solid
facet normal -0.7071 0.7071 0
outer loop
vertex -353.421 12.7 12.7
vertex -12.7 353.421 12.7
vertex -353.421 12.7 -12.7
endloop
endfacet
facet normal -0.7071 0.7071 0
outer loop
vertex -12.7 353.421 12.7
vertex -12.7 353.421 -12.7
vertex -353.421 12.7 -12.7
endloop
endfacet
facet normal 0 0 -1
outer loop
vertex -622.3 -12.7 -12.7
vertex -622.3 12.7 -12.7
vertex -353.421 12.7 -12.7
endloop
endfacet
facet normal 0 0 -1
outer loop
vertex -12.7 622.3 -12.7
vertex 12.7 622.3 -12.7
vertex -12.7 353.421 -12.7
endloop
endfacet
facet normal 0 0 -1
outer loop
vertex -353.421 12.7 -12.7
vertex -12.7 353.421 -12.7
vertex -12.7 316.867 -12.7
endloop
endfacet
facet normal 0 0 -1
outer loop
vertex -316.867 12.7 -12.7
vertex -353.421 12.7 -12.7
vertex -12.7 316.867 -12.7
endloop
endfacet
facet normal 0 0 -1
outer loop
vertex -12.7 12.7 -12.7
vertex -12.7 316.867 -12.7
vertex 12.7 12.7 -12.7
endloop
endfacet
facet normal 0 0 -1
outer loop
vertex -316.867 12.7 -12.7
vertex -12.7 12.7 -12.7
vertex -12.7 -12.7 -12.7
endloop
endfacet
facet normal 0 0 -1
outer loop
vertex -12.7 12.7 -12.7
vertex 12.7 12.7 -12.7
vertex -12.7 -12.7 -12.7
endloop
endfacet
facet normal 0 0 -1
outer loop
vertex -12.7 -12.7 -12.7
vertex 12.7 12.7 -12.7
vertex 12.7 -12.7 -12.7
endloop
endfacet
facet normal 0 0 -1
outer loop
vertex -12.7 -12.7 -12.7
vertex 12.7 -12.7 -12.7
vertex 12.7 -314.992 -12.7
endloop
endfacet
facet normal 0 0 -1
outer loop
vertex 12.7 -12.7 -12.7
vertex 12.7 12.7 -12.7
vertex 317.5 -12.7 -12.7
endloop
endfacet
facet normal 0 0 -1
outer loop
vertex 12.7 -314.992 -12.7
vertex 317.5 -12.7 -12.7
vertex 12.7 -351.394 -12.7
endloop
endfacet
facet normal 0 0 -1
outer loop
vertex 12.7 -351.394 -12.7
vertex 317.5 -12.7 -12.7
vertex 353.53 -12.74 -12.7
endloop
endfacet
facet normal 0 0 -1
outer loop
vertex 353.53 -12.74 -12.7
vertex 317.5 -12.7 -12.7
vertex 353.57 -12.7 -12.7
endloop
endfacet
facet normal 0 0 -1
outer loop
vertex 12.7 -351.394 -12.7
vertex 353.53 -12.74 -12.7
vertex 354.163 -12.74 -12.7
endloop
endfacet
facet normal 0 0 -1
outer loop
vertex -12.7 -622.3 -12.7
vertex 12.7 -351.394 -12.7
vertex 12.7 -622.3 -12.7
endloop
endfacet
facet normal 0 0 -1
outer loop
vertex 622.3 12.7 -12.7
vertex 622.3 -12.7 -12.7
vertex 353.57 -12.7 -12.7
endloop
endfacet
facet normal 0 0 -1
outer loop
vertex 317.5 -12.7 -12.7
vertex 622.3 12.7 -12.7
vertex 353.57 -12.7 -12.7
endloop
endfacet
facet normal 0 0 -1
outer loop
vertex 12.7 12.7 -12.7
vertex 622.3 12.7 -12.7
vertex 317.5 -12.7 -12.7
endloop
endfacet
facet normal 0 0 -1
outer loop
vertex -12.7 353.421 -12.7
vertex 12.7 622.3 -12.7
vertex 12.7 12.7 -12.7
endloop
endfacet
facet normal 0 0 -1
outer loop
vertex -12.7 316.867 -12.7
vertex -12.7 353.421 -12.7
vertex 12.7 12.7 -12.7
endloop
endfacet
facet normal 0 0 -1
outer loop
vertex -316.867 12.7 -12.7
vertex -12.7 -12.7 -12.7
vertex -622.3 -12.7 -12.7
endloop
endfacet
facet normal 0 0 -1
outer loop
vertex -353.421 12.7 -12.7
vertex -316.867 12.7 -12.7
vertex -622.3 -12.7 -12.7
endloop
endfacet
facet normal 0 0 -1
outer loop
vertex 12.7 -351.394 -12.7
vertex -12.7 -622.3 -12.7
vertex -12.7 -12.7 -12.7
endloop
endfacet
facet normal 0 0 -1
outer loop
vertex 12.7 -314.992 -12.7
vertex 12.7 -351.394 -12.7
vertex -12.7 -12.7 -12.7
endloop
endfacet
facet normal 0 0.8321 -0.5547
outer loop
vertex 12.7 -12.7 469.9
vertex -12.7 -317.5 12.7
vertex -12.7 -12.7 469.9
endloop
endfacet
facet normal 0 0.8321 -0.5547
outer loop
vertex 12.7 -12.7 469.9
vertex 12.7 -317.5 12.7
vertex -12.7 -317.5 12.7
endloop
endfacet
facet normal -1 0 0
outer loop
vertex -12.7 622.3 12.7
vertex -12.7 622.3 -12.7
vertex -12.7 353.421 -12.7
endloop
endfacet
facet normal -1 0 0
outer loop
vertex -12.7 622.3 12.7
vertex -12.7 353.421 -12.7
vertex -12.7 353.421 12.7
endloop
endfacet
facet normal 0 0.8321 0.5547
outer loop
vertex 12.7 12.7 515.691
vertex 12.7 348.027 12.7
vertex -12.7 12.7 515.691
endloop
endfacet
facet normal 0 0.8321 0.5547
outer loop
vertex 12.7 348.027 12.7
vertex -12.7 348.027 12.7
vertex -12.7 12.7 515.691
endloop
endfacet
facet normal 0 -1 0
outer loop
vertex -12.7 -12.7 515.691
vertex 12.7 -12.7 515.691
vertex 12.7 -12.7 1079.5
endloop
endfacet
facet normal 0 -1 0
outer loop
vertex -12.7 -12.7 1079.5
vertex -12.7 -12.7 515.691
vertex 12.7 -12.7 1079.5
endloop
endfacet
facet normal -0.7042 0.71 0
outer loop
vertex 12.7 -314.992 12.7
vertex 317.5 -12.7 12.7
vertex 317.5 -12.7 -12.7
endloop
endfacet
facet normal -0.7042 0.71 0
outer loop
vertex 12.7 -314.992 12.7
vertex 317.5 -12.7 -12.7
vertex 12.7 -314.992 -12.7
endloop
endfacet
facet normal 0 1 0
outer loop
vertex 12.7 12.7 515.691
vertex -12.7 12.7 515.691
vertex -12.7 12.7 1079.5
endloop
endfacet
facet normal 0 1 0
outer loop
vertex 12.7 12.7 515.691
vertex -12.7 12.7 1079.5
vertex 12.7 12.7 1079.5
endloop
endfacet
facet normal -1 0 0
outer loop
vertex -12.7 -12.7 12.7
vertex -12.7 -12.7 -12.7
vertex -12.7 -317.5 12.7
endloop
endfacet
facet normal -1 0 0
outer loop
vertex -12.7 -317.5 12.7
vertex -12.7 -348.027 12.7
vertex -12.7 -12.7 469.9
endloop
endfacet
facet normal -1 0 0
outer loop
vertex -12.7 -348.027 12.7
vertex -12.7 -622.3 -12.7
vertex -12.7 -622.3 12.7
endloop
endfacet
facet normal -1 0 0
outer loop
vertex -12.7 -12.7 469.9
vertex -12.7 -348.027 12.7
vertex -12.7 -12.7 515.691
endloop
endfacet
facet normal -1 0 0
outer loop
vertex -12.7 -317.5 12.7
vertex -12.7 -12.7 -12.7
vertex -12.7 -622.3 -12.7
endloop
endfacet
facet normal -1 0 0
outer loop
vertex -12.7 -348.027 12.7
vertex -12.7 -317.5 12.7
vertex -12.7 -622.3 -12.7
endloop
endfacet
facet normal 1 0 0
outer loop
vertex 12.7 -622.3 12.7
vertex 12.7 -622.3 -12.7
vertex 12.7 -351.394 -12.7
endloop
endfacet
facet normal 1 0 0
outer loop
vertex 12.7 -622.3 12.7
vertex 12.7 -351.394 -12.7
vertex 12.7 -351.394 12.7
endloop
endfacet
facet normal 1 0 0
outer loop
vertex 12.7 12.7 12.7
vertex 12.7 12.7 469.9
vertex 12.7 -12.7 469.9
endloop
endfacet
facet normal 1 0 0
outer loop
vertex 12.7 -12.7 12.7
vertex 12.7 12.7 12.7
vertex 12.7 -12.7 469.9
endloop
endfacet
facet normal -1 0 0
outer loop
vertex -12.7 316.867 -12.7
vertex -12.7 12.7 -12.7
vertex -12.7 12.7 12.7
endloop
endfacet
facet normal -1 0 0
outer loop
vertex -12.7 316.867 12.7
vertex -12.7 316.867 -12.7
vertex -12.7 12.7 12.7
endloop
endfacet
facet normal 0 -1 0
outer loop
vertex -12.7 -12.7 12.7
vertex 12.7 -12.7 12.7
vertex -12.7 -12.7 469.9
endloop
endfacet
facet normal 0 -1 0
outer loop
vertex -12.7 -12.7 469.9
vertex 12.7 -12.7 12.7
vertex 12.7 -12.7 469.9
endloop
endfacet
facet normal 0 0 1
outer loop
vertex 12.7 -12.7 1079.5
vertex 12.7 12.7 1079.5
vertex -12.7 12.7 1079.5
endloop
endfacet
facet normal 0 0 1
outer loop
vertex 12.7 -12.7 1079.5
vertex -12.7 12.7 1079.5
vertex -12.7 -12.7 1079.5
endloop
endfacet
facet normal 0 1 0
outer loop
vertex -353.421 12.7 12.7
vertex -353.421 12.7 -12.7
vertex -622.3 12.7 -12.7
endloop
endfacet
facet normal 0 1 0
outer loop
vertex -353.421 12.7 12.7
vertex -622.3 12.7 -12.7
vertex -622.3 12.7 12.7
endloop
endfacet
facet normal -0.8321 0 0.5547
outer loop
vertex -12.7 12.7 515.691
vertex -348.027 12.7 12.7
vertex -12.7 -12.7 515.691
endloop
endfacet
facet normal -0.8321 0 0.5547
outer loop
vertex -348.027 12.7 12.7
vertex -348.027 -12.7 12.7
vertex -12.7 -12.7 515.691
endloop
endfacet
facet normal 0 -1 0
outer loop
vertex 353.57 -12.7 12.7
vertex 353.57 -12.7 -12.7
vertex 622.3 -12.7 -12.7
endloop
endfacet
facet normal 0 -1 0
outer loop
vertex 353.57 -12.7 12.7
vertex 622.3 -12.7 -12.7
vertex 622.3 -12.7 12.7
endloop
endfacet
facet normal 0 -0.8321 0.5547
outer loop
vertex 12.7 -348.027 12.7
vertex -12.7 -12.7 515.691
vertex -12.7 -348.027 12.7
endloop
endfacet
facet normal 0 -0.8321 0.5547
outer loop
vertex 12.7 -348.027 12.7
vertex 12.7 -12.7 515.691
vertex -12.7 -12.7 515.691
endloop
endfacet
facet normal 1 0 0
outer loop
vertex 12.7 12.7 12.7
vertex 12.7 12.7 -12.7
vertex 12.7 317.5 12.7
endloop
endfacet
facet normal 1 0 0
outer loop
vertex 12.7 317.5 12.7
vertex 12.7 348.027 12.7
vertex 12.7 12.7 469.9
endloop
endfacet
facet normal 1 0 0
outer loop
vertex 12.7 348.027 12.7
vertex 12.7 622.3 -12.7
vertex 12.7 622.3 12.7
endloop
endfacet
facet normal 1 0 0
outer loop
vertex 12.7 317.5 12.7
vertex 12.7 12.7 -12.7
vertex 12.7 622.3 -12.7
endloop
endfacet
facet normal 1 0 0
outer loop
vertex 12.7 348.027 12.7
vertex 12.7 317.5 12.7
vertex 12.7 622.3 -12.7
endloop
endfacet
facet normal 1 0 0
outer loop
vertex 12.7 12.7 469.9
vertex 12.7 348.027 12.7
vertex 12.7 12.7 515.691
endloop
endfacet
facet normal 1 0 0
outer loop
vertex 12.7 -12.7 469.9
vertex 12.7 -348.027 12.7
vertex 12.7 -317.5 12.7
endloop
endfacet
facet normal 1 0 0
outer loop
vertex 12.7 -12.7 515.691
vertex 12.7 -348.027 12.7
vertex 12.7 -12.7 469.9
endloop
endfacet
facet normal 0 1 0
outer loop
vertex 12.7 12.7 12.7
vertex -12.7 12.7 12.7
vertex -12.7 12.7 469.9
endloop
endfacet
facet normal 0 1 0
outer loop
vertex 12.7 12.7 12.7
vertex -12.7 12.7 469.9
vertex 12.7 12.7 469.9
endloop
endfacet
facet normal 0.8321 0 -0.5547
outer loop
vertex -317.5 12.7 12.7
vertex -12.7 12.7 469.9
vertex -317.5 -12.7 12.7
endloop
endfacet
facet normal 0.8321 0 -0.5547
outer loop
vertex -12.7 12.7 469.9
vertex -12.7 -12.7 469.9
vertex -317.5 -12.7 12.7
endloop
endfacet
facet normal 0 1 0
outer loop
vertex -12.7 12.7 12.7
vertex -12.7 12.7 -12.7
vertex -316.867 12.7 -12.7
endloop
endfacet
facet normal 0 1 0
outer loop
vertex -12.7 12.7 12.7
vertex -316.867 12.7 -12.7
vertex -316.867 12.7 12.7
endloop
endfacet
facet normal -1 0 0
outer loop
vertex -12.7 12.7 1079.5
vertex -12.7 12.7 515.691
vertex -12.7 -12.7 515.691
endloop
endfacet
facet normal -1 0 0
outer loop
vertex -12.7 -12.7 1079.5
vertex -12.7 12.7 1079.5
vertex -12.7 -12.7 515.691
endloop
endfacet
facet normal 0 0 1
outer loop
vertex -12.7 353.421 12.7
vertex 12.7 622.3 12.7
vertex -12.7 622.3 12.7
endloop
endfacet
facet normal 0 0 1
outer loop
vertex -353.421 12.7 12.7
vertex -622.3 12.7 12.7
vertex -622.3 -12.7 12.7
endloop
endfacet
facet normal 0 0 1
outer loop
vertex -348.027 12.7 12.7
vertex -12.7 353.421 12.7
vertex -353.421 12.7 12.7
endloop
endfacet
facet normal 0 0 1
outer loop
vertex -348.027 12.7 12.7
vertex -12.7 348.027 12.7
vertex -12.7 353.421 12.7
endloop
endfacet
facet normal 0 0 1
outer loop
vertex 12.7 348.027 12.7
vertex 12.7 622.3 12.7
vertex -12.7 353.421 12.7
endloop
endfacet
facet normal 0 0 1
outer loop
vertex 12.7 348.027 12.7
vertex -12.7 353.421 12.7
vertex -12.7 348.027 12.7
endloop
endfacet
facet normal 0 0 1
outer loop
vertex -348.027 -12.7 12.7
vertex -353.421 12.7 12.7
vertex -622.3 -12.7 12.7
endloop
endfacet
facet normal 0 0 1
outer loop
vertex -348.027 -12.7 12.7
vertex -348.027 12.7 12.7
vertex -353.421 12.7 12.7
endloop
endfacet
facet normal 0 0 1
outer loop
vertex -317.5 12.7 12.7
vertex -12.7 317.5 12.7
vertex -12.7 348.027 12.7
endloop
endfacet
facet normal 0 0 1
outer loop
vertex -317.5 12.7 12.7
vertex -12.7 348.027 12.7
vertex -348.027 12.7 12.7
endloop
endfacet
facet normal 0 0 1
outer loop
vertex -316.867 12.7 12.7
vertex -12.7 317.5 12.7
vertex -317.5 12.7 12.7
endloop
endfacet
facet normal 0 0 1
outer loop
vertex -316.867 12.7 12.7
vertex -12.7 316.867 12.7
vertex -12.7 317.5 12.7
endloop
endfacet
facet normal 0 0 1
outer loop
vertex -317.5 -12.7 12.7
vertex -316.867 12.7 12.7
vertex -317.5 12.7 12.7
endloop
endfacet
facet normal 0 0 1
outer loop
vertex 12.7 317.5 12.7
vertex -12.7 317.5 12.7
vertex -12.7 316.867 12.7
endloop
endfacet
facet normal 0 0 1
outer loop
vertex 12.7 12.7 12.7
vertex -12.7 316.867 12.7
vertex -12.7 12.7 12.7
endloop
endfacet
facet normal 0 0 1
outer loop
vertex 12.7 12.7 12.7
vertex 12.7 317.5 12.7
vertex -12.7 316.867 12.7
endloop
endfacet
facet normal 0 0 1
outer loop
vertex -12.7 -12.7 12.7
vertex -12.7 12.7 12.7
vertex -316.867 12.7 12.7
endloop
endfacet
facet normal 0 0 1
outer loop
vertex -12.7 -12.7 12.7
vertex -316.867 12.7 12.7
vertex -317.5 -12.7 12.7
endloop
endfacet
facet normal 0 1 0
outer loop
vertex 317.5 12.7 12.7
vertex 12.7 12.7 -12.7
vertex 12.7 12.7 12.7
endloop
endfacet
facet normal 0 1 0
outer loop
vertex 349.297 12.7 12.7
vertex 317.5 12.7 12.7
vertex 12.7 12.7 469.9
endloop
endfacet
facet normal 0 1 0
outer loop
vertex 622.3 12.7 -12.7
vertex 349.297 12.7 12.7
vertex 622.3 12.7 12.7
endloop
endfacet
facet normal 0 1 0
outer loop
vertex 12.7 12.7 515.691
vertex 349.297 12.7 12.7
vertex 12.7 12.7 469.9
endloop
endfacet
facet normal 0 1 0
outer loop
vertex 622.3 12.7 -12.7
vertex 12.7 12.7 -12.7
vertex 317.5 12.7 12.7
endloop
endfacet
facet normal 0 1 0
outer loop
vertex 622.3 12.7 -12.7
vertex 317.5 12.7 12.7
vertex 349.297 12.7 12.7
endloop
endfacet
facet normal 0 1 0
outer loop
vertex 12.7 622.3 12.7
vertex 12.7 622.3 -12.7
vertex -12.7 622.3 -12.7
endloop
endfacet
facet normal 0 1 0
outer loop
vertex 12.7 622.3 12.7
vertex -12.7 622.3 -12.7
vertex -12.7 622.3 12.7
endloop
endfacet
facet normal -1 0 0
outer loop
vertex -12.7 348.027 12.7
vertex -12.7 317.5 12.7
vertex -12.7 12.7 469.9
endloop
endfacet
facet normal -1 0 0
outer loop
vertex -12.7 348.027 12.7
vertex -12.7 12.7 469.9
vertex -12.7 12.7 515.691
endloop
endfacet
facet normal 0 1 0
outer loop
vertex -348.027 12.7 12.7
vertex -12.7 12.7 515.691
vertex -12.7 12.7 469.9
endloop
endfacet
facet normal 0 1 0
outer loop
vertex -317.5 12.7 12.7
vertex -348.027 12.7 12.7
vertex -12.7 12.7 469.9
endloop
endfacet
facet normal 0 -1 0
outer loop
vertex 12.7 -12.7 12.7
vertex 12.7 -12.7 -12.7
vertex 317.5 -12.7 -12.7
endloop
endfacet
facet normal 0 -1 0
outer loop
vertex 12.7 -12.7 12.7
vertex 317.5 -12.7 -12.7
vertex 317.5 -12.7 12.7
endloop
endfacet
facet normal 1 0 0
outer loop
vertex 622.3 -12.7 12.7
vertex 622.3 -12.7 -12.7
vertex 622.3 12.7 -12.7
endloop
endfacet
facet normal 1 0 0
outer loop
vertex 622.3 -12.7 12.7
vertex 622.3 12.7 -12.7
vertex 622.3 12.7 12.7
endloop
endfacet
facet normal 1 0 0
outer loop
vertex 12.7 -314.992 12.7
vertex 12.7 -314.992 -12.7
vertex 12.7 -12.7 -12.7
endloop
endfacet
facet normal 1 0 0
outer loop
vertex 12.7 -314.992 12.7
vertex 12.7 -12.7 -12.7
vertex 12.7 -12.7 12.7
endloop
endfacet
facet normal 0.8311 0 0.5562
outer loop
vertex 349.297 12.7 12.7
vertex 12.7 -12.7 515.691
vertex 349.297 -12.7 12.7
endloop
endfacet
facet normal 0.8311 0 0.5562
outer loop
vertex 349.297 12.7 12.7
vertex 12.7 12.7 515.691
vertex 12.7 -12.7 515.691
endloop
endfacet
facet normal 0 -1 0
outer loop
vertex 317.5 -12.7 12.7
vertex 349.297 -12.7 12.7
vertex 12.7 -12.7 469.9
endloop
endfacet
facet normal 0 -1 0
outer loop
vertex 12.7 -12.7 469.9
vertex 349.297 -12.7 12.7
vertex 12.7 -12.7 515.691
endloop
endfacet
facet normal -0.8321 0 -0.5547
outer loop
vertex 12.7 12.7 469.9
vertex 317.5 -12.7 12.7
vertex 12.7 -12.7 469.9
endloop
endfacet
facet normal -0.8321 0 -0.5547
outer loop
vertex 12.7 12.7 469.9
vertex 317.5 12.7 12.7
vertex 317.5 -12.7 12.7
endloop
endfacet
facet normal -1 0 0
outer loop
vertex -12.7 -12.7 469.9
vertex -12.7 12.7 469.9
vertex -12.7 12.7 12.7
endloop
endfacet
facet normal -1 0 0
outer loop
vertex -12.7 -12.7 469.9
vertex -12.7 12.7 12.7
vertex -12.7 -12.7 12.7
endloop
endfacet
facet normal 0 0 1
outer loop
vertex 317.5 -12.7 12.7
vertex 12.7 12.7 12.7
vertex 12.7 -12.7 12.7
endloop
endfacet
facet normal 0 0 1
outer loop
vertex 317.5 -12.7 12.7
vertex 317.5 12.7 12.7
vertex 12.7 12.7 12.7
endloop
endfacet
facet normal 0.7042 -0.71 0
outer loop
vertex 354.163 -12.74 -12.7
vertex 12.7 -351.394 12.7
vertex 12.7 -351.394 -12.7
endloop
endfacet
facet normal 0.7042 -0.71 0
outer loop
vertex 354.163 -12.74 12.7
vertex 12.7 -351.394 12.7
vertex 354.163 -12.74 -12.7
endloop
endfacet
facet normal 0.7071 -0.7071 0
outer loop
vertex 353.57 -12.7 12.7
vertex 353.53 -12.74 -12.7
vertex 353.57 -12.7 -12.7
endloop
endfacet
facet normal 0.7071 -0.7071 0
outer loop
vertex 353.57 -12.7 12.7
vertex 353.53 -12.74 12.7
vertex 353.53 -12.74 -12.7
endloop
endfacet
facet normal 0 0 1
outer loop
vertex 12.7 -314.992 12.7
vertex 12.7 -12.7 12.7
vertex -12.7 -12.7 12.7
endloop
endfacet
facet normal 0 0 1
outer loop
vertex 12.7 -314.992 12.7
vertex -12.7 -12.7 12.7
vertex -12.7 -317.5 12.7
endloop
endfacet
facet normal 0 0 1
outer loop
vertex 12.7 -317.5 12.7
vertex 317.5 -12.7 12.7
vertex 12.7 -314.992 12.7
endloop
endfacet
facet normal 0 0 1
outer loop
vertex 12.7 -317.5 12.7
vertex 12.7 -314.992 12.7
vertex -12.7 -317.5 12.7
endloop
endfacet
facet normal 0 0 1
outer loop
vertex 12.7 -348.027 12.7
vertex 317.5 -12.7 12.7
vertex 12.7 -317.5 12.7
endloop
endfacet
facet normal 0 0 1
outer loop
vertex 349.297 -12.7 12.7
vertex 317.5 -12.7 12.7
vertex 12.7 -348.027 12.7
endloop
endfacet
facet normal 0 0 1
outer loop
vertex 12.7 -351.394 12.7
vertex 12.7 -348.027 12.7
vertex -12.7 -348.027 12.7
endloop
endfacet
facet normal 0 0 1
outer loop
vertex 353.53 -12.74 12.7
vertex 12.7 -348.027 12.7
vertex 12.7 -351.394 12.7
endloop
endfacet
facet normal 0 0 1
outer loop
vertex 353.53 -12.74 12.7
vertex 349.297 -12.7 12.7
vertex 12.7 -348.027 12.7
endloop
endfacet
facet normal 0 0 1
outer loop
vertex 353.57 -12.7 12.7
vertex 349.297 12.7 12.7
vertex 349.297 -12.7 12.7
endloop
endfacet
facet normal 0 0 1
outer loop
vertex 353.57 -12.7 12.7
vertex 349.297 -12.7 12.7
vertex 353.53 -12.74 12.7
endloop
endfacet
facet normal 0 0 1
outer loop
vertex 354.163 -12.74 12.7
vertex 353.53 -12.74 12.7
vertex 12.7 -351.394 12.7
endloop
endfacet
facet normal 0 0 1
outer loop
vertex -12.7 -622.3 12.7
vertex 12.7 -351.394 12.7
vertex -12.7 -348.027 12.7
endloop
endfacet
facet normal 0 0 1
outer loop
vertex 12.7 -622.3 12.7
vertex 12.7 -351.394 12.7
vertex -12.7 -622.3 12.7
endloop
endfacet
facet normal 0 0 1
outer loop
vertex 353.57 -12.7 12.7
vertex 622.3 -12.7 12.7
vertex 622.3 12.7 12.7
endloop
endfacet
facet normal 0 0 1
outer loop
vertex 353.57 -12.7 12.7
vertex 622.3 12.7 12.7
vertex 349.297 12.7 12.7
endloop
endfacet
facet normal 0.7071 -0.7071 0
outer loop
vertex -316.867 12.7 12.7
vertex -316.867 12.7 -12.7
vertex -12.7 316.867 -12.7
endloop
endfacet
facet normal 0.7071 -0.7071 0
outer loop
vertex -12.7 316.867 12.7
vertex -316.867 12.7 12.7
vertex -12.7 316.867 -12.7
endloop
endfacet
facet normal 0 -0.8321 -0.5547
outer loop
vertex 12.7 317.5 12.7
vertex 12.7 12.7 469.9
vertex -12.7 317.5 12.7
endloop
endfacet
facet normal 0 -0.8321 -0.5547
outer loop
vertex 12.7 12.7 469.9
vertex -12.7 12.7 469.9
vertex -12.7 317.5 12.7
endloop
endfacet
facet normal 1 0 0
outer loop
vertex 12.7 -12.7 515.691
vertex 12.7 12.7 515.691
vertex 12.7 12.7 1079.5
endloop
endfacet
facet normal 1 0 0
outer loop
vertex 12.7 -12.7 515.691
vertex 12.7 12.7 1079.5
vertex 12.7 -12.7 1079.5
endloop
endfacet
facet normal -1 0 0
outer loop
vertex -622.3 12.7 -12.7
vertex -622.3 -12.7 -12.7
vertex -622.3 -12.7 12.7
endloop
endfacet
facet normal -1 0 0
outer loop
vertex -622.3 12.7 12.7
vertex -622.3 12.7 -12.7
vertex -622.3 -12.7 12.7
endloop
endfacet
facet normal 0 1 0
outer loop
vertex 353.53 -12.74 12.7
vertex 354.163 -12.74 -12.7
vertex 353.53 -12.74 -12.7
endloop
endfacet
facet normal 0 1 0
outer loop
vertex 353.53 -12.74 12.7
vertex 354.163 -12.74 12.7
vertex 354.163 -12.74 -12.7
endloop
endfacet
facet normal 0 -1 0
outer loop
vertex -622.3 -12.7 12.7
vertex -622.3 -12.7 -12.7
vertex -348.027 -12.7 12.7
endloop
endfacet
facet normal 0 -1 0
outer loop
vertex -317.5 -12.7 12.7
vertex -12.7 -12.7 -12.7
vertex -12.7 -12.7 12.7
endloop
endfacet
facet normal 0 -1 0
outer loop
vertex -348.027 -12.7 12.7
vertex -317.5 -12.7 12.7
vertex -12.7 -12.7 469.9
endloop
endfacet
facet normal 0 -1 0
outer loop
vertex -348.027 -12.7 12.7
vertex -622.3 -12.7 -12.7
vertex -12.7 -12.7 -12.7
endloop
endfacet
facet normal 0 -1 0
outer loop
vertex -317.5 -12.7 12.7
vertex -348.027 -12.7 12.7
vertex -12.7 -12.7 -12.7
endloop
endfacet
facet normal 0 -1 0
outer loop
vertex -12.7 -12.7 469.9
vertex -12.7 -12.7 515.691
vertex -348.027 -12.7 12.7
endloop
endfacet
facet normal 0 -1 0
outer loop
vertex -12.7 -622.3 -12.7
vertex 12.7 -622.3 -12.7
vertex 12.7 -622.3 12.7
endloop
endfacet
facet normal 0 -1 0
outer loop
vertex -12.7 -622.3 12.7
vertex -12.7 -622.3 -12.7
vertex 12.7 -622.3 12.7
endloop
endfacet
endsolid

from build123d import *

# Parameters (mm, degrees)
F0_W      = 25.4
F0_H      = 25.4
F1_DEPTH  = 622.3
F2_W      = 25.4
F2_H      = 25.4
F3_DEPTH  = 622.3
F4_W      = 25.4
F4_H      = 25.4
F5_DEPTH  = 622.3
F6_W      = 25.4
F6_H      = 25.4
F7_DEPTH  = 622.3
F9_DEPTH  = 12.7
F10_DEPTH = 12.7
F11_W     = 25.4
F11_H     = 25.4
F12_DEPTH = 1079.5
F14_DEPTH = 12.7
F15_DEPTH = 12.7
F17_DEPTH = 12.7
F18_DEPTH = 12.7
F19_ANGLE = 90
F21_ANGLE = 180


with BuildPart() as f1:
    # F0 (on Front) → F1 (new body)
    with BuildSketch(Plane.XZ):
        Rectangle(F0_W, F0_H)
    extrude(amount=F1_DEPTH)

    # F2 (on Front) → F3 (join)
    with BuildSketch(Plane.XZ):
        Rectangle(F2_W, F2_H)
    extrude(amount=-F3_DEPTH)

    # F4 (on Top) → F5 (join)
    with BuildSketch(Plane.XY):
        Rectangle(F4_W, F4_H)
    extrude(amount=-F5_DEPTH)



with BuildPart() as f7:
    # F6 (on Top) → F7 (new body)
    with BuildSketch(Plane.XY):
        Rectangle(F6_W, F6_H)
    extrude(amount=F7_DEPTH)


with BuildPart() as f1_1:
    add(f1.part)

    add(f7.part)  # F9 merges F7
    # F8 (on Right) → F9 (join)
    with BuildSketch(Plane.YZ):
        Polygon((12.7, 317.5), (317.4895992739, 10.1820296971), (353.2631639393, 10.1820296971), (352.6753836214, 10.7746859253), (317.529985282, 10.7746859253), (12.7403860081, 318.0926562282), (12.7403860081, 353.5296019405), (12.7, 353.5703229692), align=None)
        Polygon((317.529985282, 10.7746859253), (352.6753836214, 10.7746859253), (12.7403860081, 353.5296019405), (12.7403860081, 318.0926562282), align=None)
        Polygon((12.7403860081, 353.5296019405), (352.6753836214, 10.7746859253), (353.3035499474, 10.7746859253), (12.7403860081, 354.1629791974), align=None)
        Polygon((-352.787982248, -12.7), (-317.5, -12.7), (-12.7, -317.5), (-12.7, -352.787982248), (-12.6596139919, -352.8283682561), (-12.6596139919, -316.9073437718), (-317.4596139919, -12.1073437718), (-353.3806384762, -12.1073437718), align=None)
        Polygon((-12.7, -317.5), (-317.5, -12.7), (-352.787982248, -12.7), (-12.7, -352.787982248), align=None)
        Polygon((-12.7, -352.787982248), (-352.787982248, -12.7), (-353.4210244843, -12.7), (-12.7, -353.4210244843), align=None)
    extrude(amount=F9_DEPTH)

    # F8 (on Right) → F10 (join)
    with BuildSketch(Plane.YZ):
        Polygon((12.7, 317.5), (317.4895992739, 10.1820296971), (353.2631639393, 10.1820296971), (352.6753836214, 10.7746859253), (317.529985282, 10.7746859253), (12.7403860081, 318.0926562282), (12.7403860081, 353.5296019405), (12.7, 353.5703229692), align=None)
        Polygon((317.529985282, 10.7746859253), (352.6753836214, 10.7746859253), (12.7403860081, 353.5296019405), (12.7403860081, 318.0926562282), align=None)
        Polygon((12.7403860081, 353.5296019405), (352.6753836214, 10.7746859253), (353.3035499474, 10.7746859253), (12.7403860081, 354.1629791974), align=None)
        Polygon((-352.787982248, -12.7), (-317.5, -12.7), (-12.7, -317.5), (-12.7, -352.787982248), (-12.6596139919, -352.8283682561), (-12.6596139919, -316.9073437718), (-317.4596139919, -12.1073437718), (-353.3806384762, -12.1073437718), align=None)
        Polygon((-12.7, -317.5), (-317.5, -12.7), (-352.787982248, -12.7), (-12.7, -352.787982248), align=None)
        Polygon((-12.7, -352.787982248), (-352.787982248, -12.7), (-353.4210244843, -12.7), (-12.7, -353.4210244843), align=None)
    extrude(amount=-F10_DEPTH)

    # F11 (on Right) → F12 (join)
    with BuildSketch(Plane.YZ):
        Rectangle(F11_W, F11_H)
    extrude(amount=F12_DEPTH)

    # F13 (on Front) → F14 (join)
    with BuildSketch(Plane.XZ):
        Polygon((12.7, 349.2973023653), (12.7, 317.5), (469.9, 12.7), (515.6905011984, 12.7), align=None)
        Polygon((515.6905011984, -12.7), (469.9, -12.7), (12.7, -317.5), (12.7, -348.0270007989), align=None)
    extrude(amount=F14_DEPTH)

    # F13 (on Front) → F15 (join)
    with BuildSketch(Plane.XZ):
        Polygon((12.7, 349.2973023653), (12.7, 317.5), (469.9, 12.7), (515.6905011984, 12.7), align=None)
        Polygon((515.6905011984, -12.7), (469.9, -12.7), (12.7, -317.5), (12.7, -348.0270007989), align=None)
    extrude(amount=-F15_DEPTH)

    # F16 (on Top) → F17 (join)
    with BuildSketch(Plane.XY):
        Polygon((12.7, 317.5), (469.9, 12.7), (515.6905011984, 12.7), (12.7, 348.0270007989), align=None)
        Polygon((515.6905011984, -12.7), (469.9, -12.7), (12.7, -317.5), (12.7, -348.0270007989), align=None)
    extrude(amount=F17_DEPTH)

    # F16 (on Top) → F18 (join)
    with BuildSketch(Plane.XY):
        Polygon((12.7, 317.5), (469.9, 12.7), (515.6905011984, 12.7), (12.7, 348.0270007989), align=None)
        Polygon((515.6905011984, -12.7), (469.9, -12.7), (12.7, -317.5), (12.7, -348.0270007989), align=None)
    extrude(amount=-F18_DEPTH)


with BuildPart() as f1_2:
    # F19: moved
    add(f1_1.part.rotate(Axis((-12.7, -311.15, -12.7), (0, 1, 0)), F19_ANGLE))


with BuildPart() as f1_3:
    # F20: moved
    add(f1_2.part.moved(Location((0, 0, -25.4))))


with BuildPart() as f1_4:
    # F21: moved
    add(f1_3.part.rotate(Axis((311.15, 12.7, -38.1), (-1, 0, 0)), F21_ANGLE))


with BuildPart() as f1_5:
    # F22: moved
    add(f1_4.part.moved(Location((0, -25.4, 0))))


with BuildPart() as f1_6:
    # F23: moved
    add(f1_5.part.moved(Location((0, 0, 25.4))))


solid = f1_6.part
